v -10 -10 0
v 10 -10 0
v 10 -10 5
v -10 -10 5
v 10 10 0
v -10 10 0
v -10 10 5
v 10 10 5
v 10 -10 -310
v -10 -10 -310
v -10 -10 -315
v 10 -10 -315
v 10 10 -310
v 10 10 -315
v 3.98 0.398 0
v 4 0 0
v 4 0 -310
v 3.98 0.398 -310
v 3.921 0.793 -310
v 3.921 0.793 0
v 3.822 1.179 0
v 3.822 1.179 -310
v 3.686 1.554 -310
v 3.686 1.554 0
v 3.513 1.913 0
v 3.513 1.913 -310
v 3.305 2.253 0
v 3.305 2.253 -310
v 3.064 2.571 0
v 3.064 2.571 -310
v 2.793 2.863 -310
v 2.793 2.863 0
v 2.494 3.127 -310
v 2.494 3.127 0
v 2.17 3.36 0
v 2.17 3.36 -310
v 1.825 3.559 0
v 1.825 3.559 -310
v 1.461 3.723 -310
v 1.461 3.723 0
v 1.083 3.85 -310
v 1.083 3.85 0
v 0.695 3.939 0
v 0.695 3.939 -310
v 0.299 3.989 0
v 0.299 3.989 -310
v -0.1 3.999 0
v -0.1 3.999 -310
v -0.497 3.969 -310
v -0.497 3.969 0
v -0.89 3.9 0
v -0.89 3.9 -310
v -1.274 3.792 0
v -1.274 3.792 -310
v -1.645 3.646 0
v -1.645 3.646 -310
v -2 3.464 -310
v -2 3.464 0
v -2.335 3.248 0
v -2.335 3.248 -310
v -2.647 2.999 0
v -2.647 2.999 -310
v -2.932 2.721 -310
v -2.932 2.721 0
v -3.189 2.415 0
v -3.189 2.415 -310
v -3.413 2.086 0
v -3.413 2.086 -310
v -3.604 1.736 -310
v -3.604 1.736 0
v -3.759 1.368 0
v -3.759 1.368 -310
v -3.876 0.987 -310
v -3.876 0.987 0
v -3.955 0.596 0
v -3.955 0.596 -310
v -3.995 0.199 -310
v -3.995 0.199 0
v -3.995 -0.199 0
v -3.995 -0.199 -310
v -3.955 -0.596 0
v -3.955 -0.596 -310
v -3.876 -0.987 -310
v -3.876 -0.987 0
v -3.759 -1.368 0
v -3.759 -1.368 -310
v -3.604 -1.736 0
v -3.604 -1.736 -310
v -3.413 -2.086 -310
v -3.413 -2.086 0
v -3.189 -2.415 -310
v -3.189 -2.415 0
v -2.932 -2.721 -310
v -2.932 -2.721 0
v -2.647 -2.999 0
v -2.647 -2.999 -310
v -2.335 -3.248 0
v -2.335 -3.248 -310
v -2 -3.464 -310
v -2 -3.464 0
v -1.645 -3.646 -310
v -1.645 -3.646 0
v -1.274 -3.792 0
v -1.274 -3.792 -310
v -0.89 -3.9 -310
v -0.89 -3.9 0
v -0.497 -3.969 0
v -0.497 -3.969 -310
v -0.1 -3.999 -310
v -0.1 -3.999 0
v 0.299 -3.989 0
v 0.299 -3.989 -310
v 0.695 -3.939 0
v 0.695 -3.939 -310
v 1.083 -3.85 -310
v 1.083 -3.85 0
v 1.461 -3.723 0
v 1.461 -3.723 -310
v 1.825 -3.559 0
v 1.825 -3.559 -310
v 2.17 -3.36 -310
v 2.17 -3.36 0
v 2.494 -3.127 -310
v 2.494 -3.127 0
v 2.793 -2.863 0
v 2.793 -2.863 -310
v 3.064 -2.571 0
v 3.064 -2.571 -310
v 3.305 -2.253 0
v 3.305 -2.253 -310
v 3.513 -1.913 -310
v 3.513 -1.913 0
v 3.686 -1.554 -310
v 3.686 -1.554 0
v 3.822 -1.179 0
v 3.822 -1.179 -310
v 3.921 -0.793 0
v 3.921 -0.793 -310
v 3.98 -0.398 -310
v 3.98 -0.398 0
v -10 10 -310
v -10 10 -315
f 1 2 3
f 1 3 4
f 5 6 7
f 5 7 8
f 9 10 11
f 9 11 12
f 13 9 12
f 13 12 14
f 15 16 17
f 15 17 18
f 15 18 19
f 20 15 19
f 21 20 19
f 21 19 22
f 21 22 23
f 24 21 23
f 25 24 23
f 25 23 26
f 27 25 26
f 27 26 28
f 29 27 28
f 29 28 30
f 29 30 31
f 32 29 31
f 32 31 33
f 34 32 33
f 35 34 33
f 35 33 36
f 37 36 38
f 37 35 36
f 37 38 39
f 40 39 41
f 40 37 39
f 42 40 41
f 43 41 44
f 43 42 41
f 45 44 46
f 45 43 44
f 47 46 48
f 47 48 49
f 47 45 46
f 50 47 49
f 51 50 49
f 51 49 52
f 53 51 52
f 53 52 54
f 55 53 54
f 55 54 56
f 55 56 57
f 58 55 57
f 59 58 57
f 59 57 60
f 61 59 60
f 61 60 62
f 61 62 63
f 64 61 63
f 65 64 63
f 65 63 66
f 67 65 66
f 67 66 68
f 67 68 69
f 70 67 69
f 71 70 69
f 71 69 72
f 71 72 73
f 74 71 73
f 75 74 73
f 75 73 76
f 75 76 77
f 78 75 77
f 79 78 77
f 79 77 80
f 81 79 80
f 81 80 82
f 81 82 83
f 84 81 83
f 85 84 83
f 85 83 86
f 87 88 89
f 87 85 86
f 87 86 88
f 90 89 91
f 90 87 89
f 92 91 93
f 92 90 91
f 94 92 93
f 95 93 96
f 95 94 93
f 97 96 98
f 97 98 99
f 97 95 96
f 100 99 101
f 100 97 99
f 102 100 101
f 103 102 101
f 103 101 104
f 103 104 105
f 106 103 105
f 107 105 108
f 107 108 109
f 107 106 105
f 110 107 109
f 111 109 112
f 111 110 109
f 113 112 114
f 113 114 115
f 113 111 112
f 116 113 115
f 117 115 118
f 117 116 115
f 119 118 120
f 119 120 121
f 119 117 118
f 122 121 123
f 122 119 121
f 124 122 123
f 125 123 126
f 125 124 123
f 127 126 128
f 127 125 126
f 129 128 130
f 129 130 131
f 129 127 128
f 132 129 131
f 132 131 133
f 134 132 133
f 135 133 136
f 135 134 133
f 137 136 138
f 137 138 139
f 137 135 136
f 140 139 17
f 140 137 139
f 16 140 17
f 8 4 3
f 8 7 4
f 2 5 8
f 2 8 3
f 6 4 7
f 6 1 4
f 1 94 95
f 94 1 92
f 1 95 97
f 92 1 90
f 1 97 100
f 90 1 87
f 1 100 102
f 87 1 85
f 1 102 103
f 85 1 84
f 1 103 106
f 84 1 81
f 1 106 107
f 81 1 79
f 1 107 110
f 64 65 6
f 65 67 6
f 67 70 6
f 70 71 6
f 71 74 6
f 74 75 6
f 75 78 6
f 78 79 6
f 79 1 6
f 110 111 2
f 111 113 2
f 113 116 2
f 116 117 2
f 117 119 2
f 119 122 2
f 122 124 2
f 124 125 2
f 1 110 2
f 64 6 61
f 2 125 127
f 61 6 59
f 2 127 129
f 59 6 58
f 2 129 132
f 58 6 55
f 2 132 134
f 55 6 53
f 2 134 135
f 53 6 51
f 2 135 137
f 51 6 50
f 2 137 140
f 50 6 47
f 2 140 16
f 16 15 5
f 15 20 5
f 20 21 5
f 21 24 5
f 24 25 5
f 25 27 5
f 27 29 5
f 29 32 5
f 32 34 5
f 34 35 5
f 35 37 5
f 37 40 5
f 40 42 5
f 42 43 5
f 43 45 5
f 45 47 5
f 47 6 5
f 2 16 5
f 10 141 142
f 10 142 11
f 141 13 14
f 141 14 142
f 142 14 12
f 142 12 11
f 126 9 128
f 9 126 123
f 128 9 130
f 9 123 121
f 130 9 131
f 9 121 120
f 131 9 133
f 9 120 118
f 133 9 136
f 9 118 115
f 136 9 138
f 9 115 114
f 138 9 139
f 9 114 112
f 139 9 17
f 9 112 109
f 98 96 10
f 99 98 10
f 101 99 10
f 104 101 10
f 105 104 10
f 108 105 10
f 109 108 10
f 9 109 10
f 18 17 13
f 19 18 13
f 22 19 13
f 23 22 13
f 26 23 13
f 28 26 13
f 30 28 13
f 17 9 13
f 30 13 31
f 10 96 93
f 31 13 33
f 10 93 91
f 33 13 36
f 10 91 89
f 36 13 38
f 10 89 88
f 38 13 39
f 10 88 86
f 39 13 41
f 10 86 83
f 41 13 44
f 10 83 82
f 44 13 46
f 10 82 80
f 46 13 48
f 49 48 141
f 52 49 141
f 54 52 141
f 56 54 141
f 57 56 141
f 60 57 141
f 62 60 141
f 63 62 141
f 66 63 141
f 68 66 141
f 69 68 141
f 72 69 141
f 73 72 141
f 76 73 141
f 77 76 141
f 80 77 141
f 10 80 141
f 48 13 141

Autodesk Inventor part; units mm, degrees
ref_plane "YZ Plane" through (0, 0, 0) normal (1, 0, 0) x (0, 1, 0)
ref_plane "XZ Plane" through (0, 0, 0) normal (0, 1, 0) x (-1, 0, 0)
sketch "Sketch1" plane through (0, 0, 0) normal (0, 0, 1) x (1, 0, 0)
  circle A0 centre (0, 0) radius 4
  dimension "d0" = 8
extrude "Extrusion1" add sketch "Sketch1" against normal blind 310
sketch "Sketch2" plane through (0, 0, 0) normal (0, 0, 1) x (1, 0, 0)
  line L0 (-10, 10) -> (10, 10)
  line L1 (10, 10) -> (10, -10)
  line L2 (10, -10) -> (-10, -10)
  line L3 (-10, -10) -> (-10, 10)
  line L4 (-10, 10) -> (10, -10) construction
  line L5 (10, 10) -> (-10, -10) construction
  point P0 (0, 0)
  dimension "d3" = 20
extrude "Extrusion2" add sketch "Sketch2" along normal blind 5
ref_plane "Work Plane1" through (0, 0, -155) normal (0, 0, -1) x (-1, 0, 0)
mirror "Mirror1" about plane through (0, 0, -155) normal (0, 0, -1) of "Extrusion2"
properties part number "front axle" material "Steel, Mild"
